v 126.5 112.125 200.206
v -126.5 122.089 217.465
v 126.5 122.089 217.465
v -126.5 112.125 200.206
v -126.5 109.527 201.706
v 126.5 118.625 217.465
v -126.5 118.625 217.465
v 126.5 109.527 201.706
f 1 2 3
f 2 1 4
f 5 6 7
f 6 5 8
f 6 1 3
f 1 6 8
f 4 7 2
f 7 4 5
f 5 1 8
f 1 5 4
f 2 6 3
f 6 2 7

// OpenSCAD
// =============================================================================
// CONSOLE10 — Slant gap cap  v0.1
//
// A glue-on filler that closes the gap on the front 30-deg slant between the TOP
// panel and the TOP of the display faceplate (now mounted at the highest slant
// inserts). It follows the slant profile, is flush with the 3 mm display panel
// front, and extends 3 mm DOWN over the panel top (a lap that hides the seam).
// Glued to the top; not screwed.
//
// Local frame (= print orientation, lay it flat):
//   X = width,  Y = up the slant,  Z = thickness  (+Z = operator/front side).
// =============================================================================

// ---- shared geometry (kept equal to the module + faceplate) ----
slant_angle = 30;          // front slant, degrees from vertical
U           = 44.45;       // 1U
floor_t     = 6;           // bottom-panel slab thickness (slant seat reference)
front_gap   = U;           // 1U gap above the front-bottom corner
front_n_u   = 4;           // 4U slant mount capacity
top_margin  = 15;          // gap at the top of the slant above the highest mount
front_len   = front_gap + front_n_u * U + top_margin;   // 237.25 — slant length
back_h      = front_len * cos(slant_angle);             // 205.45 — cheek back-edge height
top_slab    = 6;                                        // top-panel slab thickness
top_top_z   = floor_t + back_h + top_slab;             // 217.45 — TOP of the top panel

// ---- display panel placement it caps (must match Console10_module.scad) ----
plate_h        = 3 * U;        // 133.35 — display faceplate height (3U)
panel_slant_up = (front_gap + (front_n_u - 1)*U + 38.10) - 127.00;  // 88.90 (highest-mount shift)
panel_top_s    = panel_slant_up + plate_h;     // 222.25 — panel top, along slant

// ---- cap ----
cap_w     = 253;           // full module width (flush with the cheek outer faces)
cap_t     = 3;             // thickness, flush with the display panel front
clr       = 2;             // CLEARANCE above the panel top (cap stops short — no overlap)
cap_bot   = panel_top_s + clr;                           // 224.25 — cap bottom, along slant
// run the plate up PAST the top of the top panel; the placement trims it flat there
cap_top_s = (top_top_z - floor_t) / cos(slant_angle) + 8;
cap_len   = cap_top_s - cap_bot;

$fn = 48;

echo(str("SLANT CAP  panel_top_s=", panel_top_s, "  cap_bot=", cap_bot,
         "  clearance_above_panel=", cap_bot - panel_top_s, " mm",
         "  top trimmed @ z=", top_top_z));

// raw plate in the local (print) frame, oversized at the top
module slant_cap() {
    translate([-cap_w/2, 0, 0]) cube([cap_w, cap_len, cap_t]);
}

// placed onto the slant (same tilt + seat as the faceplate), then TRIMMED flat at
// the top so the top face is horizontal + flush with the top of the top panel.
module slant_cap_on_slant() {
    difference() {
        translate([0, sin(slant_angle) * cap_bot, cos(slant_angle) * cap_bot])
            translate([0, 0, floor_t])
                rotate([90 - slant_angle, 0, 0])
                    slant_cap();
        translate([0, 0, top_top_z + 500]) cube([cap_w + 20, 2000, 1000], center = true);
    }
}

// Print orientation: undo the slant placement so the flat back lands on the bed
// (3 mm tall, with the angled trimmed top as an edge).
module slant_cap_for_print() {
    rotate([-(90 - slant_angle), 0, 0])
        translate([0, 0, -floor_t])
            translate([0, -sin(slant_angle) * cap_bot, -cos(slant_angle) * cap_bot])
                slant_cap_on_slant();
}

// Render: on-slant preview by default; -D print_mode=true for the flat print export.
print_mode = false;
if (print_mode) slant_cap_for_print();
else            slant_cap_on_slant();
